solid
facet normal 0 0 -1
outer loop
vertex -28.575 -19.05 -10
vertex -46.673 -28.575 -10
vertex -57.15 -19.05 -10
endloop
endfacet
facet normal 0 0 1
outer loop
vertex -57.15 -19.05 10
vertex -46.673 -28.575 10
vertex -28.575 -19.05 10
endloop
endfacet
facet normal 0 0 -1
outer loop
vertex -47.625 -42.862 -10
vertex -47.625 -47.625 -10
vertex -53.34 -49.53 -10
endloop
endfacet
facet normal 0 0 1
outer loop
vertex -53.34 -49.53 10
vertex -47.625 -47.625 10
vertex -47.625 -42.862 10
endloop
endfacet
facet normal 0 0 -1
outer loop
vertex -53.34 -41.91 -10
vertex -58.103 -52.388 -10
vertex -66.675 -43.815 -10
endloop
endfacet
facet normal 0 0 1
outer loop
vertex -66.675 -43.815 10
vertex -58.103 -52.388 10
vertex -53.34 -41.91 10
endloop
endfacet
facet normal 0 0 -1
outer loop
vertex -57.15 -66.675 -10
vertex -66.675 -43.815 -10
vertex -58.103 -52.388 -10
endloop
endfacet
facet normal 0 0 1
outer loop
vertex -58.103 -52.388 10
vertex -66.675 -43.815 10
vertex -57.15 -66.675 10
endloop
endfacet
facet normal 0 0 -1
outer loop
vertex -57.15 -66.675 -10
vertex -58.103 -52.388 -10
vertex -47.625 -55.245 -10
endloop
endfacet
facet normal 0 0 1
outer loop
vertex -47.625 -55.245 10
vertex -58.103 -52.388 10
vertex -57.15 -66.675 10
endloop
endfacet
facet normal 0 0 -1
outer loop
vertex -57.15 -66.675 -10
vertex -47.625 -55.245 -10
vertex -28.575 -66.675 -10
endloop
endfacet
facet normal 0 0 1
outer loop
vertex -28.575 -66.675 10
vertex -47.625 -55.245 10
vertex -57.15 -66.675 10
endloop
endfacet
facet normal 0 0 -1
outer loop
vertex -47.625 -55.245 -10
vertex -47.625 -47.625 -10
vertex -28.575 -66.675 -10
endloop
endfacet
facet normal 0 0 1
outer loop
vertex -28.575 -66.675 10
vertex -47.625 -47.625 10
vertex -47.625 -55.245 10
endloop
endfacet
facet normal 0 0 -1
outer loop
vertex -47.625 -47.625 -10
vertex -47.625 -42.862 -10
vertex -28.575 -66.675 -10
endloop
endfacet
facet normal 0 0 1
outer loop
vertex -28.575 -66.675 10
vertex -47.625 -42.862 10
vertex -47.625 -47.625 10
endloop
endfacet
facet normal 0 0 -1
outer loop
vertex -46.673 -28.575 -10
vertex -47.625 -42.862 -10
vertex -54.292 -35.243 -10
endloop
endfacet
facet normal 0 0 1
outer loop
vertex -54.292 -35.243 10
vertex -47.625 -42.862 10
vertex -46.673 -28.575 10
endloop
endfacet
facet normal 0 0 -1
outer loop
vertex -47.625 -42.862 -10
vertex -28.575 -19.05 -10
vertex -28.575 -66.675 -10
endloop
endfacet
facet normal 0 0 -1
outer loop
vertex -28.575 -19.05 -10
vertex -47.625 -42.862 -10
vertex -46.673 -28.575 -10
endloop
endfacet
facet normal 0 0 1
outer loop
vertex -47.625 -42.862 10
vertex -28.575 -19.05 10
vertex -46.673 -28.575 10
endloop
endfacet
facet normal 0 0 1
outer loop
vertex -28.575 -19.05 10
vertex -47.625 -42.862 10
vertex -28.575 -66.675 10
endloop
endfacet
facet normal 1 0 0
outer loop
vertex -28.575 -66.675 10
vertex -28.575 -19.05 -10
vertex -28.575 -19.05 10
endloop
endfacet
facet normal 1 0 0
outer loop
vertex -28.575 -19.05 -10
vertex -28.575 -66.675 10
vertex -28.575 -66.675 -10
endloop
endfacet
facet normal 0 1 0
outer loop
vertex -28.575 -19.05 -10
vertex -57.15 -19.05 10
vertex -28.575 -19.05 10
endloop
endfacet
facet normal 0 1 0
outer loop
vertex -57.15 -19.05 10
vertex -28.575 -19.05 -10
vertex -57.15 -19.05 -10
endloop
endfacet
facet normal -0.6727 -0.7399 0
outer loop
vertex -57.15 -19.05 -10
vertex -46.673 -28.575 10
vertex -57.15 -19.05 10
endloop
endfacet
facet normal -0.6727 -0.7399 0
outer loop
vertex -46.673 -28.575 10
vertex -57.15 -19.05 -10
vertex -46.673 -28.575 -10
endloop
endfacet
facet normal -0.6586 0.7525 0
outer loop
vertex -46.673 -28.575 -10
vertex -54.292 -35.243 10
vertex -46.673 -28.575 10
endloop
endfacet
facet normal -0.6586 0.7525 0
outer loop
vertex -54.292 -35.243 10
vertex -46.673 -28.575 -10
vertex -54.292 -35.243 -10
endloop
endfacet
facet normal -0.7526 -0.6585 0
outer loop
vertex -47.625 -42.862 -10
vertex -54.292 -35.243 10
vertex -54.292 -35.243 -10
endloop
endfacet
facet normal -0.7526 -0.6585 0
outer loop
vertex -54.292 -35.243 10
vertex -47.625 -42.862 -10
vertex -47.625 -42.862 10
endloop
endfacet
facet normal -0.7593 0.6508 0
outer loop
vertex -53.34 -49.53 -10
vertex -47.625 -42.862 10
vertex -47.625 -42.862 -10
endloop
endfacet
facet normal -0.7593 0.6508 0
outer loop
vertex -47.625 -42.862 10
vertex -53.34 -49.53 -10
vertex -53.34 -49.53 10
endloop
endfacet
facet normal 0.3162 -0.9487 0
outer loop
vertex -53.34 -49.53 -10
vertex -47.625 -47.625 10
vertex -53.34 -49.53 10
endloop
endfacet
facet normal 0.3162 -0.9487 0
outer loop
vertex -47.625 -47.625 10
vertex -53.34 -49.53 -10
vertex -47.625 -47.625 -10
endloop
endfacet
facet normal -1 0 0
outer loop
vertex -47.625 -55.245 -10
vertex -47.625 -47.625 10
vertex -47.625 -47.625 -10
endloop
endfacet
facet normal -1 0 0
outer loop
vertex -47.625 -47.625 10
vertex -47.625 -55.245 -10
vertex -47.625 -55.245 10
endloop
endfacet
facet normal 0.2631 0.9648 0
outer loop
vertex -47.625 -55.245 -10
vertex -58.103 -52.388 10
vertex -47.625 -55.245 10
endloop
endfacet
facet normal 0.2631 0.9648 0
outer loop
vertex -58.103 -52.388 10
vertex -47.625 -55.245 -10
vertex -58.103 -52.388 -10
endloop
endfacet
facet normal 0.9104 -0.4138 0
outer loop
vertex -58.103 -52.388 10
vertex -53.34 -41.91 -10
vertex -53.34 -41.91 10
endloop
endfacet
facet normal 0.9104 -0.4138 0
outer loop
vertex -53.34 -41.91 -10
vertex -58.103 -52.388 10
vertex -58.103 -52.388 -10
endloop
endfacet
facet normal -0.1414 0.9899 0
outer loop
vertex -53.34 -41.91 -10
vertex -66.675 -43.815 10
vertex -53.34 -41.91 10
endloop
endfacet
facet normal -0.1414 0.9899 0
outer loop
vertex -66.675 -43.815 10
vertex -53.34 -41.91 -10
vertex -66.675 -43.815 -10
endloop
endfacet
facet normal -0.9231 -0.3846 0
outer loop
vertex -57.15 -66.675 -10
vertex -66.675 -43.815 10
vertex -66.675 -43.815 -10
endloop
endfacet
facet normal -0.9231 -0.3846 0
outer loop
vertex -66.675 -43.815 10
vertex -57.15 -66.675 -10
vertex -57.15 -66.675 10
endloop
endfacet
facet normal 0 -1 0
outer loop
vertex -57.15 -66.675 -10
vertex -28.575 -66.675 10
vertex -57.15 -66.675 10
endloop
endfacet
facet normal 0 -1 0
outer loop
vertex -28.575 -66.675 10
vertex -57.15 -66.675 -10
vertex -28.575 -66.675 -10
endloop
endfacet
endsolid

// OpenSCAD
polyhedron(
    points=[
    [-28.575, -66.675, -10],
    [-28.575, -19.05, -10],
    [-57.15, -19.05, -10],
    [-46.6725, -28.575, -10],
    [-54.2925, -35.2425, -10],
    [-47.625, -42.8625, -10],
    [-53.34, -49.53, -10],
    [-47.625, -47.625, -10],
    [-47.625, -55.245, -10],
    [-58.1025, -52.3875, -10],
    [-53.34, -41.91, -10],
    [-66.675, -43.815, -10],
    [-57.15, -66.675, -10],
    [-28.575, -66.675, 10],
    [-28.575, -19.05, 10],
    [-57.15, -19.05, 10],
    [-46.6725, -28.575, 10],
    [-54.2925, -35.2425, 10],
    [-47.625, -42.8625, 10],
    [-53.34, -49.53, 10],
    [-47.625, -47.625, 10],
    [-47.625, -55.245, 10],
    [-58.1025, -52.3875, 10],
    [-53.34, -41.91, 10],
    [-66.675, -43.815, 10],
    [-57.15, -66.675, 10],
    ],
    faces=[
        [2,3,1],
        [14,16,15],
        [6,7,5],
        [18,20,19],
        [11,9,10],
        [23,22,24],
        [9,11,12],
        [25,24,22],
        [8,9,12],
        [25,22,21],
        [0,8,12],
        [25,21,13],
        [0,7,8],
        [21,20,13],
        [0,5,7],
        [20,18,13],
        [4,5,3],
        [16,18,17],
        [3,5,0,1],
        [14,13,18,16],
        [0,13,14,1],
        [1,14,15,2],
        [2,15,16,3],
        [3,16,17,4],
        [4,17,18,5],
        [5,18,19,6],
        [6,19,20,7],
        [7,20,21,8],
        [8,21,22,9],
        [9,22,23,10],
        [10,23,24,11],
        [11,24,25,12],
        [12,25,13,0],
    ]
);
